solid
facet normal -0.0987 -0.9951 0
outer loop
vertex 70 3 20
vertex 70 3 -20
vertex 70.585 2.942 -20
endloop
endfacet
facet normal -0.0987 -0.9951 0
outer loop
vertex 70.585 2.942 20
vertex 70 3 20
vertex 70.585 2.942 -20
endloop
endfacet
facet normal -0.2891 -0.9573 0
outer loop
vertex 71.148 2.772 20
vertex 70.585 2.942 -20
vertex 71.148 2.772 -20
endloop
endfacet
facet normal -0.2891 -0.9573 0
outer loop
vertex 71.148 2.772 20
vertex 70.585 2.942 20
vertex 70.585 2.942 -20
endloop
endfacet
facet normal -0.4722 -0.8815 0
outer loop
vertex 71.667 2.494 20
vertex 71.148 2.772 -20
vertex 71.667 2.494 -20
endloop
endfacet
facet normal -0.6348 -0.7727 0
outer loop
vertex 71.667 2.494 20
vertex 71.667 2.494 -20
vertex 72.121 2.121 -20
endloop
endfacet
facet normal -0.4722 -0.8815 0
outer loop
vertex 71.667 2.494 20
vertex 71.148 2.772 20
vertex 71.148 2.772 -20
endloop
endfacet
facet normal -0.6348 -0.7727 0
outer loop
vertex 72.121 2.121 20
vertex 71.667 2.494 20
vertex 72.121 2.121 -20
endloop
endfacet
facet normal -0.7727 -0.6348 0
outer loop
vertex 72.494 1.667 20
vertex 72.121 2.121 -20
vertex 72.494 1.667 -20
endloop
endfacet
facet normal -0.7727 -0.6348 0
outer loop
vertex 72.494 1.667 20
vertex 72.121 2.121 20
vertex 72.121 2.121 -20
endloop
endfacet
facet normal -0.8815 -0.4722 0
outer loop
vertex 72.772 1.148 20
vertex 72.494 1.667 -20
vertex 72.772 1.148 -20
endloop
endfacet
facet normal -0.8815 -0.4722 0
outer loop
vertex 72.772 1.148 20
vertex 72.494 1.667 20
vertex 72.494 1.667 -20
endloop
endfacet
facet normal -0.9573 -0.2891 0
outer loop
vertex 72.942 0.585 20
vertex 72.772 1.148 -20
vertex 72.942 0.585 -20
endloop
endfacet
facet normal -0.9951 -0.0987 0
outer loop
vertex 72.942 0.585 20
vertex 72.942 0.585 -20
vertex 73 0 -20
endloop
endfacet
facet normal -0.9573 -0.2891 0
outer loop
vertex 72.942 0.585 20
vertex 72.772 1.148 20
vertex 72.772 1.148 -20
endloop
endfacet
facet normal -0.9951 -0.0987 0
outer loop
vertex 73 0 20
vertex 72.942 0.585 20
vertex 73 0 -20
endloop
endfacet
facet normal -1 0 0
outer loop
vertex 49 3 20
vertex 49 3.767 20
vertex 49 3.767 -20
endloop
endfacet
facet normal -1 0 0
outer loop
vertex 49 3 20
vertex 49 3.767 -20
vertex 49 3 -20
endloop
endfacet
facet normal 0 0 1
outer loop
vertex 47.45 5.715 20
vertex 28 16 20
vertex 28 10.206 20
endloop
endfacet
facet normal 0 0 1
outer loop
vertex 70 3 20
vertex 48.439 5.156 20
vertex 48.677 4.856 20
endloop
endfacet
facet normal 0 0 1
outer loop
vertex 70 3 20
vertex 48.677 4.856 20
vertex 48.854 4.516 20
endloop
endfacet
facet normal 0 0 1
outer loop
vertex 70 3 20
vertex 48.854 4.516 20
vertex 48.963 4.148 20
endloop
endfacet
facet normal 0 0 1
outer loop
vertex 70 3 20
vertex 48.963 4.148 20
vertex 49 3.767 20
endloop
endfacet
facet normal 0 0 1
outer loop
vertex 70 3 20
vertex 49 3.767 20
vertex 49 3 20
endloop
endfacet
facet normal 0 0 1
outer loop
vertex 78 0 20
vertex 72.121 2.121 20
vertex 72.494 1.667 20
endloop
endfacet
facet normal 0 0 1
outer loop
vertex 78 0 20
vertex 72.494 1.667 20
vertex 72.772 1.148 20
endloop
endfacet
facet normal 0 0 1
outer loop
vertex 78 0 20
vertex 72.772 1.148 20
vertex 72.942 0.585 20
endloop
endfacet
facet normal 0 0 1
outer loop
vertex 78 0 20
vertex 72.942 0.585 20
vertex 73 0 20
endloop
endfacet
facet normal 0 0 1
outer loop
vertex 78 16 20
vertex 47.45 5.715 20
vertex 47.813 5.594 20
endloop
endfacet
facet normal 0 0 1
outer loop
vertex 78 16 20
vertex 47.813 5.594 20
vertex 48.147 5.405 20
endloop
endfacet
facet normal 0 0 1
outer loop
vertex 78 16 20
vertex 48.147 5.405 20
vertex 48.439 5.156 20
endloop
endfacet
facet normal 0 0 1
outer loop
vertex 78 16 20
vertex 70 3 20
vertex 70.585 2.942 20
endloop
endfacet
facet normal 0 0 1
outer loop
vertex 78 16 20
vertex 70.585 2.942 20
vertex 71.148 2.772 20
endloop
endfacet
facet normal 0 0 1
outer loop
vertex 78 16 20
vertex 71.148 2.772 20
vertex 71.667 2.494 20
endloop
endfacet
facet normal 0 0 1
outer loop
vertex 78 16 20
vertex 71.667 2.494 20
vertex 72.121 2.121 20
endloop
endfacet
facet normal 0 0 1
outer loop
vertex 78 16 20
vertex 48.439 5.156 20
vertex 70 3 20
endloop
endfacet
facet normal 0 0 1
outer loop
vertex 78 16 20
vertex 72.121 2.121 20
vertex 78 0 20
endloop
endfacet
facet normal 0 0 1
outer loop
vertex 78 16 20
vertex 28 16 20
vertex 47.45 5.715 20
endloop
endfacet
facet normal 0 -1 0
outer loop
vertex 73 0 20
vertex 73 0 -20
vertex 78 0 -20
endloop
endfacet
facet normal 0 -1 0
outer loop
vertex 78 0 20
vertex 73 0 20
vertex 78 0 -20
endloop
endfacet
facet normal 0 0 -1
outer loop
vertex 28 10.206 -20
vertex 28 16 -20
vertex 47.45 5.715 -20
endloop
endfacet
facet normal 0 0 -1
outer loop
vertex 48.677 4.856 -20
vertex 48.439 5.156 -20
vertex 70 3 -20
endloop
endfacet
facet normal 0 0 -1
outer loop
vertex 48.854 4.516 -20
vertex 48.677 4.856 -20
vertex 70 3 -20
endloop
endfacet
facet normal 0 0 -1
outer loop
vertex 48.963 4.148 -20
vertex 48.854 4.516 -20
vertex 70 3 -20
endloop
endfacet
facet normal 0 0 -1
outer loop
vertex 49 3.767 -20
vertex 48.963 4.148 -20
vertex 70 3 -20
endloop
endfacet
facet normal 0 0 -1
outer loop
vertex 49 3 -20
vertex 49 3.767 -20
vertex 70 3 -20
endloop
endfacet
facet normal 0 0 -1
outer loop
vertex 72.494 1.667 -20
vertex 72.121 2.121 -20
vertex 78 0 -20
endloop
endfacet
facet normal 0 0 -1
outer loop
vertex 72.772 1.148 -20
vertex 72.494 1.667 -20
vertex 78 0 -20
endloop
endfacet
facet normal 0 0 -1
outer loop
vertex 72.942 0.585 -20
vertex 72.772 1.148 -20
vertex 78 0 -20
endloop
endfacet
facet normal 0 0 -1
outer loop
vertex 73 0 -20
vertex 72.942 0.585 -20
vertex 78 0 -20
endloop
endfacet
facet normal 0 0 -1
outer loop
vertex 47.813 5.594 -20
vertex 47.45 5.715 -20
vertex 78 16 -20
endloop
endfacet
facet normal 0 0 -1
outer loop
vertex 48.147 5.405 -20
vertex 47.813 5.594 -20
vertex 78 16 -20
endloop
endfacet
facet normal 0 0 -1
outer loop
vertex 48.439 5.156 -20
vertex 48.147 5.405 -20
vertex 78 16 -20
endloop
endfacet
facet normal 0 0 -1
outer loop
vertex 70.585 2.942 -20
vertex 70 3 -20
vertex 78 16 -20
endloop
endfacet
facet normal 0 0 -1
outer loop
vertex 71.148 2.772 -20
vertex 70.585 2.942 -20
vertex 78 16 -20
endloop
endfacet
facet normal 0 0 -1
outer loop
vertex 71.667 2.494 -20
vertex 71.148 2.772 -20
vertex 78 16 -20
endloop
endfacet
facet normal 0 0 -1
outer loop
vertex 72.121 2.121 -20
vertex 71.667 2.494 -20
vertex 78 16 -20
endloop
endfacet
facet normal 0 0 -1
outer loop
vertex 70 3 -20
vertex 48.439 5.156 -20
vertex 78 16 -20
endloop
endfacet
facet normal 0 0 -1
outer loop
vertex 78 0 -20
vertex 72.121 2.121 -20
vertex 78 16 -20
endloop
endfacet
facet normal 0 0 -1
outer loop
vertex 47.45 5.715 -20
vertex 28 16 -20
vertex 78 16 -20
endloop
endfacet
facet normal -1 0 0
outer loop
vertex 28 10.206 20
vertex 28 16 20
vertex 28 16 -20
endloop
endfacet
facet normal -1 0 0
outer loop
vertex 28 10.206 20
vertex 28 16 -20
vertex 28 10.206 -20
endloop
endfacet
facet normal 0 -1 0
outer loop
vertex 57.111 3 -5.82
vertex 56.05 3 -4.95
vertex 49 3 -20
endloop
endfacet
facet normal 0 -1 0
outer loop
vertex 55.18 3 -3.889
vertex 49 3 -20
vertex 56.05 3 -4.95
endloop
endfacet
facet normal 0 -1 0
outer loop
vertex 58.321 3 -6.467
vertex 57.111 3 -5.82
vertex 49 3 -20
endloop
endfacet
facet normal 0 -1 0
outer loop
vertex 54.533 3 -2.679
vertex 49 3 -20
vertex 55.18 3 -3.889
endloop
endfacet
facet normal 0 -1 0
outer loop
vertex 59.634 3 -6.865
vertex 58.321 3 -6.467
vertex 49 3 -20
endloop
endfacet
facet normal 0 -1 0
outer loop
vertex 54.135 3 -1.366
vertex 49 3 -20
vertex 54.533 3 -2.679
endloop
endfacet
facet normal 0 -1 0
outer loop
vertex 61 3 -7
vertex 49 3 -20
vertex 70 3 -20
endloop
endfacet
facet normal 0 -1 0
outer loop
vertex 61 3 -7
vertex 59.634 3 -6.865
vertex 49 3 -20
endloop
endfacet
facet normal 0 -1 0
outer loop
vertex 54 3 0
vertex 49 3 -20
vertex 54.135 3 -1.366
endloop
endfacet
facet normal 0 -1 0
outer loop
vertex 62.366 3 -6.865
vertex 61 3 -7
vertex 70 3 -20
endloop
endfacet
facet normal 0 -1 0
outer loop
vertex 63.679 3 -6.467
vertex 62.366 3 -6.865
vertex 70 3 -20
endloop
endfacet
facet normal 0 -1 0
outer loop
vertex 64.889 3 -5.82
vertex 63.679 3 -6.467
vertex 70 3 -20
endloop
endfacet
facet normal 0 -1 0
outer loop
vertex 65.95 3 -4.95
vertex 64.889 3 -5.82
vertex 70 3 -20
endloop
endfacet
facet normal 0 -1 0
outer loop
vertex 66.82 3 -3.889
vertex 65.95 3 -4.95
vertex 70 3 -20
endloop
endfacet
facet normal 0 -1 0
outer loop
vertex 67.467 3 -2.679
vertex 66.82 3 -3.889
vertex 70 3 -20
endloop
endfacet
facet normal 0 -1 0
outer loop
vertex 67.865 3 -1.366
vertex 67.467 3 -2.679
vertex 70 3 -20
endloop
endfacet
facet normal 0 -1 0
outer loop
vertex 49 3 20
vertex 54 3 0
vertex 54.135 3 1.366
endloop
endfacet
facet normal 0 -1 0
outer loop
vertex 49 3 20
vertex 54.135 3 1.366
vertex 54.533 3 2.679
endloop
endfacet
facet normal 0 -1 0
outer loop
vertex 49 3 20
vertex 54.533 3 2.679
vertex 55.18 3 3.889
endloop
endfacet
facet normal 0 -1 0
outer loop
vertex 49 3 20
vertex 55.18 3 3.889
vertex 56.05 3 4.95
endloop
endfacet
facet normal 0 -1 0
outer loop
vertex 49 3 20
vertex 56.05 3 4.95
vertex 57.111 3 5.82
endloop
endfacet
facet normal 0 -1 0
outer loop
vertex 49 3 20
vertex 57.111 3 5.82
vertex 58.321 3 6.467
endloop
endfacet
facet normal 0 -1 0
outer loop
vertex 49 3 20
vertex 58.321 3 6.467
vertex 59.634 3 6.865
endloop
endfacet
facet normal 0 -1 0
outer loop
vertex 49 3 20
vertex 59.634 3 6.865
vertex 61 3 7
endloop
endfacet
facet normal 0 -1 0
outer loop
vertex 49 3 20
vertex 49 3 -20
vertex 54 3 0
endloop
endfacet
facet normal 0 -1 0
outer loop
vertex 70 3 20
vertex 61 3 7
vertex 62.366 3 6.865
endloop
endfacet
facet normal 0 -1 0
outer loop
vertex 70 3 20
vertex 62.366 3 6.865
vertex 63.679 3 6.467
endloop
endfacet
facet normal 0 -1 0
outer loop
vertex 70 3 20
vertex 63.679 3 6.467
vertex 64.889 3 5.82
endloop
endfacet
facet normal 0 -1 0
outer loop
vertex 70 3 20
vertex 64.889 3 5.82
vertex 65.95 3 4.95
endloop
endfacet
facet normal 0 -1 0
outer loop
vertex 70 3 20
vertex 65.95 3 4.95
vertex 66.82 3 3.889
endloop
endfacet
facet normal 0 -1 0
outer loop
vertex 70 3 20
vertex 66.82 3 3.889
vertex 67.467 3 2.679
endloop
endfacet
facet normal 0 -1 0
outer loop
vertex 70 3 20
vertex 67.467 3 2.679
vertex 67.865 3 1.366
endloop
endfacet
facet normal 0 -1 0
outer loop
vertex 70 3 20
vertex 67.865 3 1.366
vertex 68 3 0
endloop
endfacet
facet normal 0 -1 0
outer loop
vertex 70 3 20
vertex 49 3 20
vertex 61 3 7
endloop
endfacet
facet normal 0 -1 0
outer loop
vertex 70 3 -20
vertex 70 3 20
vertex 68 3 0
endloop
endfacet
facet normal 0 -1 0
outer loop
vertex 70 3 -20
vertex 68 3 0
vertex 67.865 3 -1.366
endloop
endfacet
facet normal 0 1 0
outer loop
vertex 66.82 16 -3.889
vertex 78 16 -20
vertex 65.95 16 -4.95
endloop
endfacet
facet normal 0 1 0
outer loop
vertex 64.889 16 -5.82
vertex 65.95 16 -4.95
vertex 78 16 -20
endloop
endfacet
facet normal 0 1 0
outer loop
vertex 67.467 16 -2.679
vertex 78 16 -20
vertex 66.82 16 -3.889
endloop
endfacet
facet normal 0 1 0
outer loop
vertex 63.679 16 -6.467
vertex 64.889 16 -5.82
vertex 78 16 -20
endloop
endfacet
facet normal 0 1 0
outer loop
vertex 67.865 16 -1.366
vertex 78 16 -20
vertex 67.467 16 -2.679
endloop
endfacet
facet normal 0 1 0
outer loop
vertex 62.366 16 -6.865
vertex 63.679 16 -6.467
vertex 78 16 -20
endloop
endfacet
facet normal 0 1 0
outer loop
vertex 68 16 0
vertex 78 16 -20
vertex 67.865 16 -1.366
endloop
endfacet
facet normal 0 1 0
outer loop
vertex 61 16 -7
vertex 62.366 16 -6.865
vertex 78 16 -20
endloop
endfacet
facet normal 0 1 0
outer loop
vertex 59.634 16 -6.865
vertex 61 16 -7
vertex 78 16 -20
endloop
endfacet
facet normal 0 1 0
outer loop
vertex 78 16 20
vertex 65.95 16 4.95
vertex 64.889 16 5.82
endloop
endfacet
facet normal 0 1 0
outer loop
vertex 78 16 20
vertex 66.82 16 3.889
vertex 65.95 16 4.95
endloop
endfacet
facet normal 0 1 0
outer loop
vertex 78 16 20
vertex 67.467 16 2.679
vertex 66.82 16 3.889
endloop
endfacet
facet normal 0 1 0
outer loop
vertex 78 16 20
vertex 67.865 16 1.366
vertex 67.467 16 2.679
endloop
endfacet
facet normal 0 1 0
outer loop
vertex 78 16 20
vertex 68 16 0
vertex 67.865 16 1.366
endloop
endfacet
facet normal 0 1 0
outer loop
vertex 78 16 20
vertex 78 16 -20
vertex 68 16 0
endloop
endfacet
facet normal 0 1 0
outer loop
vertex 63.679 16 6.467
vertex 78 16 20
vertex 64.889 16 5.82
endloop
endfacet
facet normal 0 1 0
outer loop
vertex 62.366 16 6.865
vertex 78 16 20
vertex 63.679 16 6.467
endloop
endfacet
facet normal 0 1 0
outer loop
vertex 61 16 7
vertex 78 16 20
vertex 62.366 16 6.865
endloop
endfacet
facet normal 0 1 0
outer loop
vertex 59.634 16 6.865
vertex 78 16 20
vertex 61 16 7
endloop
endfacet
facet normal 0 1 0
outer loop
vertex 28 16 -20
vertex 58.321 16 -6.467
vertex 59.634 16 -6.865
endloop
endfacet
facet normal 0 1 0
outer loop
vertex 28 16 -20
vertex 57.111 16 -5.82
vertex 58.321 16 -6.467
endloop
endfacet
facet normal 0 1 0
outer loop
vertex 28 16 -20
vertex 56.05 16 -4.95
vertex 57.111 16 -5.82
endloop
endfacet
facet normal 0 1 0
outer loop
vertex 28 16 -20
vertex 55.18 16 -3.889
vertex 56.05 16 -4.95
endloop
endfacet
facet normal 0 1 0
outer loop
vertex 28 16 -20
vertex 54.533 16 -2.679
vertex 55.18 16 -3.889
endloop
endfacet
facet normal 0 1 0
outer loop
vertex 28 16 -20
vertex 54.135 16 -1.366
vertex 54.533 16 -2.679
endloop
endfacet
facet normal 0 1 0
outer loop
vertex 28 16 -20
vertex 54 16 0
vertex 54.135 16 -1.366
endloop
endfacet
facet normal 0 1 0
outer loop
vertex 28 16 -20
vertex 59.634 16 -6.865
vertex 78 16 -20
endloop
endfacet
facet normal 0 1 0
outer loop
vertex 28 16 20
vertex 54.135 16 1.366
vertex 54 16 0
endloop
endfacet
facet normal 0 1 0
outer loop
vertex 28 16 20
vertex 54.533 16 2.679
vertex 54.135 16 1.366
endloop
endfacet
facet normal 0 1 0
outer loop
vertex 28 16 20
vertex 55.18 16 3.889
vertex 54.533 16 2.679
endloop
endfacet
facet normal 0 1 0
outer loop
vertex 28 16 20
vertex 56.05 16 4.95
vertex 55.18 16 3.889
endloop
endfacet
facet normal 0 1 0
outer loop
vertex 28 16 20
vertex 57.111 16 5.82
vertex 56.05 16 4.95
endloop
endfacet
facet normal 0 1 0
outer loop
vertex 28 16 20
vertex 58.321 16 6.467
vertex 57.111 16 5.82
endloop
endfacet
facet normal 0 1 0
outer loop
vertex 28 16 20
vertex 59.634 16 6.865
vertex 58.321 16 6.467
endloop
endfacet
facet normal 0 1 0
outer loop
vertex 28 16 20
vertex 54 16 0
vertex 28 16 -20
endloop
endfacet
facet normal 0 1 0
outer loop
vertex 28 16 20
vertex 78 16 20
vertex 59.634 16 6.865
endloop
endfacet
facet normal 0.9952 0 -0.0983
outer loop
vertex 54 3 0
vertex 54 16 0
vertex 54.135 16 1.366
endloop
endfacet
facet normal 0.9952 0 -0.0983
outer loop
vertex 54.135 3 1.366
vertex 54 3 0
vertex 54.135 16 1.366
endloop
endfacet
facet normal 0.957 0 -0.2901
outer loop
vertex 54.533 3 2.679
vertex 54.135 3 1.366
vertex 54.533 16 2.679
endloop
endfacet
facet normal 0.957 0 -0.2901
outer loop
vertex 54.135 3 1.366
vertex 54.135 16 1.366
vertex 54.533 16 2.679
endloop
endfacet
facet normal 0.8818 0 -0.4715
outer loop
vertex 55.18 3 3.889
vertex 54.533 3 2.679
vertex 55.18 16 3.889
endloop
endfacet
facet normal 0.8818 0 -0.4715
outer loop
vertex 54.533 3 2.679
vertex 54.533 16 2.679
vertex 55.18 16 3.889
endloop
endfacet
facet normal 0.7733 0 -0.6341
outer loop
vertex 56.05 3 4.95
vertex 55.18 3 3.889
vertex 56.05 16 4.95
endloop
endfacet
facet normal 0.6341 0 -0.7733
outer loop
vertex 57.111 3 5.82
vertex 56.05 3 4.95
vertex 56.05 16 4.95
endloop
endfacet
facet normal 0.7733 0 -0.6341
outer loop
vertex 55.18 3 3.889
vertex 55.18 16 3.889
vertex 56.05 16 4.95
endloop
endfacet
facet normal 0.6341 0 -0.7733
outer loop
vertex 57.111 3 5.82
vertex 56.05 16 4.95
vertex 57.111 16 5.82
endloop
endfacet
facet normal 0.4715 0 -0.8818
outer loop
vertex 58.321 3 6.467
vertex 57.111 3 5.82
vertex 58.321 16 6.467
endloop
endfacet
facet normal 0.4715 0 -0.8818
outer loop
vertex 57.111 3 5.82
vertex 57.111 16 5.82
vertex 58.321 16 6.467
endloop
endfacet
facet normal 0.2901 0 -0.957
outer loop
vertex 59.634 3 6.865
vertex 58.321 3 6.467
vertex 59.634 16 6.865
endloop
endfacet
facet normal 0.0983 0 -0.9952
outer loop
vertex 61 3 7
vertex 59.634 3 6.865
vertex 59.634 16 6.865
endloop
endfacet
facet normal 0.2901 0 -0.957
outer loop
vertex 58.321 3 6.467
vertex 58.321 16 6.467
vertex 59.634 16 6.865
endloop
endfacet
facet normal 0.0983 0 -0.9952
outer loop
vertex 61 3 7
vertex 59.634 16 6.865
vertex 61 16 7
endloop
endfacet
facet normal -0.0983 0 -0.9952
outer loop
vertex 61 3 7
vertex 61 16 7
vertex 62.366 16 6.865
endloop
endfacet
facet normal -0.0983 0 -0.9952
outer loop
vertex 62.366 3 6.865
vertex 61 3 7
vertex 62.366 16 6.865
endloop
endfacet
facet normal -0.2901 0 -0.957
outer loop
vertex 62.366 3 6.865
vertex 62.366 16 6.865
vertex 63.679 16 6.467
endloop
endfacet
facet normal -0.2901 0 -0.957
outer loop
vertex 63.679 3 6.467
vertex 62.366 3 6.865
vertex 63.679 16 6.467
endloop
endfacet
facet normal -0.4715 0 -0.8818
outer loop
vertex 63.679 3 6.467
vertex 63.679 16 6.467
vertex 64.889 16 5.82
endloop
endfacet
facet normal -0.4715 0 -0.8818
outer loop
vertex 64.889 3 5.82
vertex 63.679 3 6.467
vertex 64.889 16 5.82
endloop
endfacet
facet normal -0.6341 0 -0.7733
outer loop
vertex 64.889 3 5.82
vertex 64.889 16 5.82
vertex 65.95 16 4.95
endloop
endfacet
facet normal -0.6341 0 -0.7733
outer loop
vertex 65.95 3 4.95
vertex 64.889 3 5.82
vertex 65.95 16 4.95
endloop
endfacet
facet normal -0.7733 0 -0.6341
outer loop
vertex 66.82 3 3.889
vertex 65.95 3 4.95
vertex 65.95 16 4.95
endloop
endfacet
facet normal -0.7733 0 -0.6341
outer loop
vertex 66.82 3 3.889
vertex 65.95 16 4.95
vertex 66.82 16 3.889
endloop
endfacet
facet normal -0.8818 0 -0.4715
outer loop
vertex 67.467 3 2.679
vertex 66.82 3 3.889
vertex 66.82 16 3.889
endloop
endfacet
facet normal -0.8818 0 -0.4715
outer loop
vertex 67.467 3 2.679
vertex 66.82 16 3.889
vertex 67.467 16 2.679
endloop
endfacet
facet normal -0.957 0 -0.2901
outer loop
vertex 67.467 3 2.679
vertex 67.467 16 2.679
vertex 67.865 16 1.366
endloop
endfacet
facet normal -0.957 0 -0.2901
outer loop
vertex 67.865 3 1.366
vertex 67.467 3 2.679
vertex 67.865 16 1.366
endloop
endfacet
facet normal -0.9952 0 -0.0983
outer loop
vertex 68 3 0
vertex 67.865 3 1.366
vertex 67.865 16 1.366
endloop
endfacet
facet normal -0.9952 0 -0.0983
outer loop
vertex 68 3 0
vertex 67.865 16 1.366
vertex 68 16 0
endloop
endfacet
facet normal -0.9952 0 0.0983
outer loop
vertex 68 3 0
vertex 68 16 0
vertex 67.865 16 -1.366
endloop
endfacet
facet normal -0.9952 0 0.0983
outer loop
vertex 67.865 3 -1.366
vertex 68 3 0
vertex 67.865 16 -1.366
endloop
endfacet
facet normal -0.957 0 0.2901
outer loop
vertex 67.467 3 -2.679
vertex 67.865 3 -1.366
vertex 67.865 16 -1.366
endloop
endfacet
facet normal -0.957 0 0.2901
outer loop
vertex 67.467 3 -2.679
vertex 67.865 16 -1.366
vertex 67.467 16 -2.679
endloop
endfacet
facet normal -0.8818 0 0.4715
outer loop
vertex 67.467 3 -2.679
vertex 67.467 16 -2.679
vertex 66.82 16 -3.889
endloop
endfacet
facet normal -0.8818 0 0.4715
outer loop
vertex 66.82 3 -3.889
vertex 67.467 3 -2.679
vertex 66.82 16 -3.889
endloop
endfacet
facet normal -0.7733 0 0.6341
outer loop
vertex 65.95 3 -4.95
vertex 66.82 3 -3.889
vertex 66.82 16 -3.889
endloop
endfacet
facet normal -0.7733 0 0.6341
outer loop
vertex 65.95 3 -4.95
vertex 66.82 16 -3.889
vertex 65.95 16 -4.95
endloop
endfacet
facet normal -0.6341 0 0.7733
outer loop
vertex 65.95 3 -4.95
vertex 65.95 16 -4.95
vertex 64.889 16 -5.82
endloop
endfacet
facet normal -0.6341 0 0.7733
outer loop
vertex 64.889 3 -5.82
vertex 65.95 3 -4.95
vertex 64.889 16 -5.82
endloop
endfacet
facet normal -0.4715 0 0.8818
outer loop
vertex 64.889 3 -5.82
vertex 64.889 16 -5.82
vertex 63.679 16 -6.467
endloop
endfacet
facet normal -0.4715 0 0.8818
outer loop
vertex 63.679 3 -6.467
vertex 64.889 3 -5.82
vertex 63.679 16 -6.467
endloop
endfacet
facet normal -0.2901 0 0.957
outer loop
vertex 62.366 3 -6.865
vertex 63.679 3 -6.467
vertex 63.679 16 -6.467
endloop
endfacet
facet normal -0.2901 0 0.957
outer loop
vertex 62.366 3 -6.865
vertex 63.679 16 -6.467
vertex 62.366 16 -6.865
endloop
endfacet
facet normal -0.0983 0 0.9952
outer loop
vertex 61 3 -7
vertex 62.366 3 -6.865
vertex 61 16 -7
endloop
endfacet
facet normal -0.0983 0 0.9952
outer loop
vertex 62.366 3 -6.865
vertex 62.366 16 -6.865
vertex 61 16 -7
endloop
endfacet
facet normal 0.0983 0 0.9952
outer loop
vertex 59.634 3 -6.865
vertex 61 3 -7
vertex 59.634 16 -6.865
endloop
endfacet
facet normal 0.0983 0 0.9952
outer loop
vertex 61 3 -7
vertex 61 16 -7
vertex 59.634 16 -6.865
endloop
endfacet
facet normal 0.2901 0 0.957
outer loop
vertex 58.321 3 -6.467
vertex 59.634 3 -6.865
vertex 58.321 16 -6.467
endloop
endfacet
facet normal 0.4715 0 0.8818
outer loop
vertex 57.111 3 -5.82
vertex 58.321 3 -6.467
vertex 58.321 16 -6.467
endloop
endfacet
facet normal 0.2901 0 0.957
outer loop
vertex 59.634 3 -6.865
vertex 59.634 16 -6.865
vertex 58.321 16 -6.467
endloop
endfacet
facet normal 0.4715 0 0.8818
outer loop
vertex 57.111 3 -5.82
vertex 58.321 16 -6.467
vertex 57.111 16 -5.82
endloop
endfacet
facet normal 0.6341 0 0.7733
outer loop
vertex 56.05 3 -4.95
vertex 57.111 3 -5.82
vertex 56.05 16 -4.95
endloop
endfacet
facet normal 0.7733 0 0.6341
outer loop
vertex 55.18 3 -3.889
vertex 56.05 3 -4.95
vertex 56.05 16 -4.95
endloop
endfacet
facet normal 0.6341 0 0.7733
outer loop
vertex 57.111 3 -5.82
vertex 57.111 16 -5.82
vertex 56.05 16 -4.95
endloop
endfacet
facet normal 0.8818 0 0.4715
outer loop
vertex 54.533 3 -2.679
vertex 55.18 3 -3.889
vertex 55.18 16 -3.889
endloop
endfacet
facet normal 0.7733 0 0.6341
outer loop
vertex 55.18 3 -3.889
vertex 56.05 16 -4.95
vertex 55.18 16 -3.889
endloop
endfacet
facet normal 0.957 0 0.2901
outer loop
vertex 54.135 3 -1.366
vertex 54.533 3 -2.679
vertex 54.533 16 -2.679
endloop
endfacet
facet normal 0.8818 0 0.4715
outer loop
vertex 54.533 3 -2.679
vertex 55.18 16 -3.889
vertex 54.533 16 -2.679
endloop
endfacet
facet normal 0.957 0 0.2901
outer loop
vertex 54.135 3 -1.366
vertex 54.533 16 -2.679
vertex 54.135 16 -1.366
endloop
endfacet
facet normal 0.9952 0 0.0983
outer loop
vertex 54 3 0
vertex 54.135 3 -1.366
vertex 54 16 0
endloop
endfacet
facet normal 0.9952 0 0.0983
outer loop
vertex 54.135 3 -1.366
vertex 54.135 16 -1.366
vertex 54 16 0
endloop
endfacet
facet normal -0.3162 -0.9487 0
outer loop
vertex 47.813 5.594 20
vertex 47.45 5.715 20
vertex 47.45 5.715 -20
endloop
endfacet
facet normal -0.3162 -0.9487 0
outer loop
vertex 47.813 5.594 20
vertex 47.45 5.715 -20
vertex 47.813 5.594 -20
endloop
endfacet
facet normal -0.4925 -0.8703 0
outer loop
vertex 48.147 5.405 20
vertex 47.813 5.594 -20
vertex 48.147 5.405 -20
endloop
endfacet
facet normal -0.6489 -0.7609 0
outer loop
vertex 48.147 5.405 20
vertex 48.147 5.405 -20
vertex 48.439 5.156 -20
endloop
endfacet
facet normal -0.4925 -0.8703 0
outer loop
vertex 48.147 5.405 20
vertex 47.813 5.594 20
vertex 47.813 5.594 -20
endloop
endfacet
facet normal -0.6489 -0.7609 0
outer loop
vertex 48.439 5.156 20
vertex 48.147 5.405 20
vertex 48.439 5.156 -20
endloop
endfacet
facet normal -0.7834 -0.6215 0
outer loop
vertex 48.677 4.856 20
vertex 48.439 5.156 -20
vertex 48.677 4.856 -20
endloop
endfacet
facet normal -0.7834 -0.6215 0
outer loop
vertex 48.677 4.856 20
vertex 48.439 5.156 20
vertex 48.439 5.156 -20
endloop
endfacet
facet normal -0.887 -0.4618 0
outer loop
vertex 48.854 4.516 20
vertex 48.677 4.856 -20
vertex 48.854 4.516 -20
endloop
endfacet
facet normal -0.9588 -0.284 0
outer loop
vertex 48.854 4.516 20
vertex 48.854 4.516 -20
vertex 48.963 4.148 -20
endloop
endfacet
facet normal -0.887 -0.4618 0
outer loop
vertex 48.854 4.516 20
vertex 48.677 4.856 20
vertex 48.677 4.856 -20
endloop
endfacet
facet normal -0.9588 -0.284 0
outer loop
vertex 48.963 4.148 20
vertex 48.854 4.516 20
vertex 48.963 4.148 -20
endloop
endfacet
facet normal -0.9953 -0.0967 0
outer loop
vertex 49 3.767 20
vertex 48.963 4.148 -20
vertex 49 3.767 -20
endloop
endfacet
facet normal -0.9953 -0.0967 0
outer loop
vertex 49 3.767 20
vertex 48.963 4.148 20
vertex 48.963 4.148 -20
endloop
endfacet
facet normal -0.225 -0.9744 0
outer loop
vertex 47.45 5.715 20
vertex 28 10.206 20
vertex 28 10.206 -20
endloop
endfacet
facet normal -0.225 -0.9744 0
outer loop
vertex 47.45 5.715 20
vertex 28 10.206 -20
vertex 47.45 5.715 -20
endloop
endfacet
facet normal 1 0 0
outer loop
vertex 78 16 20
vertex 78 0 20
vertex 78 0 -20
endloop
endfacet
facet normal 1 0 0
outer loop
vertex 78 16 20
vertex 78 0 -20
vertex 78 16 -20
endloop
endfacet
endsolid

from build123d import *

# Parameters (mm, degrees)
EXTRUDE_1_DEPTH     = 20
SKETCH_2_R          = 7
CUT_EXTRUDE_1_DEPTH = 83.097503007


with BuildPart() as part:
    # ｽｹｯﾁ1 → ﾎﾞｽ - 押し出し1 (new, symmetric)
    with BuildSketch(Plane.XY):
        with BuildLine():
            Line((73, 0), (78, 0))
            Line((78, 0), (78, 16))
            Line((78, 16), (28, 16))
            Line((28, 16), (28, 10.205732014))
            Line((28, 10.205732014), (47.449902109, 5.715368296))
            ThreePointArc((47.449902109, 5.715368296), (48.565216314, 5.01165744), (49, 3.766628167))
            Line((49, 3.766628167), (49, 3))
            Line((49, 3), (70, 3))
            ThreePointArc((70, 3), (72.121320344, 2.121320344), (73, 0))
        make_face()
    extrude(amount=EXTRUDE_1_DEPTH, both=True)

    # ｽｹｯﾁ2 → ｶｯﾄ - 押し出し1 (cut, through all)
    with BuildSketch(Plane(origin=(0, 16, 0), x_dir=(1, 0, 0), z_dir=(0, 1, 0))):
        with Locations(Location((61, 0, 0), (0, 0, 180))):
            Circle(SKETCH_2_R)
    extrude(amount=-CUT_EXTRUDE_1_DEPTH, mode=Mode.SUBTRACT)


solid = part.part
